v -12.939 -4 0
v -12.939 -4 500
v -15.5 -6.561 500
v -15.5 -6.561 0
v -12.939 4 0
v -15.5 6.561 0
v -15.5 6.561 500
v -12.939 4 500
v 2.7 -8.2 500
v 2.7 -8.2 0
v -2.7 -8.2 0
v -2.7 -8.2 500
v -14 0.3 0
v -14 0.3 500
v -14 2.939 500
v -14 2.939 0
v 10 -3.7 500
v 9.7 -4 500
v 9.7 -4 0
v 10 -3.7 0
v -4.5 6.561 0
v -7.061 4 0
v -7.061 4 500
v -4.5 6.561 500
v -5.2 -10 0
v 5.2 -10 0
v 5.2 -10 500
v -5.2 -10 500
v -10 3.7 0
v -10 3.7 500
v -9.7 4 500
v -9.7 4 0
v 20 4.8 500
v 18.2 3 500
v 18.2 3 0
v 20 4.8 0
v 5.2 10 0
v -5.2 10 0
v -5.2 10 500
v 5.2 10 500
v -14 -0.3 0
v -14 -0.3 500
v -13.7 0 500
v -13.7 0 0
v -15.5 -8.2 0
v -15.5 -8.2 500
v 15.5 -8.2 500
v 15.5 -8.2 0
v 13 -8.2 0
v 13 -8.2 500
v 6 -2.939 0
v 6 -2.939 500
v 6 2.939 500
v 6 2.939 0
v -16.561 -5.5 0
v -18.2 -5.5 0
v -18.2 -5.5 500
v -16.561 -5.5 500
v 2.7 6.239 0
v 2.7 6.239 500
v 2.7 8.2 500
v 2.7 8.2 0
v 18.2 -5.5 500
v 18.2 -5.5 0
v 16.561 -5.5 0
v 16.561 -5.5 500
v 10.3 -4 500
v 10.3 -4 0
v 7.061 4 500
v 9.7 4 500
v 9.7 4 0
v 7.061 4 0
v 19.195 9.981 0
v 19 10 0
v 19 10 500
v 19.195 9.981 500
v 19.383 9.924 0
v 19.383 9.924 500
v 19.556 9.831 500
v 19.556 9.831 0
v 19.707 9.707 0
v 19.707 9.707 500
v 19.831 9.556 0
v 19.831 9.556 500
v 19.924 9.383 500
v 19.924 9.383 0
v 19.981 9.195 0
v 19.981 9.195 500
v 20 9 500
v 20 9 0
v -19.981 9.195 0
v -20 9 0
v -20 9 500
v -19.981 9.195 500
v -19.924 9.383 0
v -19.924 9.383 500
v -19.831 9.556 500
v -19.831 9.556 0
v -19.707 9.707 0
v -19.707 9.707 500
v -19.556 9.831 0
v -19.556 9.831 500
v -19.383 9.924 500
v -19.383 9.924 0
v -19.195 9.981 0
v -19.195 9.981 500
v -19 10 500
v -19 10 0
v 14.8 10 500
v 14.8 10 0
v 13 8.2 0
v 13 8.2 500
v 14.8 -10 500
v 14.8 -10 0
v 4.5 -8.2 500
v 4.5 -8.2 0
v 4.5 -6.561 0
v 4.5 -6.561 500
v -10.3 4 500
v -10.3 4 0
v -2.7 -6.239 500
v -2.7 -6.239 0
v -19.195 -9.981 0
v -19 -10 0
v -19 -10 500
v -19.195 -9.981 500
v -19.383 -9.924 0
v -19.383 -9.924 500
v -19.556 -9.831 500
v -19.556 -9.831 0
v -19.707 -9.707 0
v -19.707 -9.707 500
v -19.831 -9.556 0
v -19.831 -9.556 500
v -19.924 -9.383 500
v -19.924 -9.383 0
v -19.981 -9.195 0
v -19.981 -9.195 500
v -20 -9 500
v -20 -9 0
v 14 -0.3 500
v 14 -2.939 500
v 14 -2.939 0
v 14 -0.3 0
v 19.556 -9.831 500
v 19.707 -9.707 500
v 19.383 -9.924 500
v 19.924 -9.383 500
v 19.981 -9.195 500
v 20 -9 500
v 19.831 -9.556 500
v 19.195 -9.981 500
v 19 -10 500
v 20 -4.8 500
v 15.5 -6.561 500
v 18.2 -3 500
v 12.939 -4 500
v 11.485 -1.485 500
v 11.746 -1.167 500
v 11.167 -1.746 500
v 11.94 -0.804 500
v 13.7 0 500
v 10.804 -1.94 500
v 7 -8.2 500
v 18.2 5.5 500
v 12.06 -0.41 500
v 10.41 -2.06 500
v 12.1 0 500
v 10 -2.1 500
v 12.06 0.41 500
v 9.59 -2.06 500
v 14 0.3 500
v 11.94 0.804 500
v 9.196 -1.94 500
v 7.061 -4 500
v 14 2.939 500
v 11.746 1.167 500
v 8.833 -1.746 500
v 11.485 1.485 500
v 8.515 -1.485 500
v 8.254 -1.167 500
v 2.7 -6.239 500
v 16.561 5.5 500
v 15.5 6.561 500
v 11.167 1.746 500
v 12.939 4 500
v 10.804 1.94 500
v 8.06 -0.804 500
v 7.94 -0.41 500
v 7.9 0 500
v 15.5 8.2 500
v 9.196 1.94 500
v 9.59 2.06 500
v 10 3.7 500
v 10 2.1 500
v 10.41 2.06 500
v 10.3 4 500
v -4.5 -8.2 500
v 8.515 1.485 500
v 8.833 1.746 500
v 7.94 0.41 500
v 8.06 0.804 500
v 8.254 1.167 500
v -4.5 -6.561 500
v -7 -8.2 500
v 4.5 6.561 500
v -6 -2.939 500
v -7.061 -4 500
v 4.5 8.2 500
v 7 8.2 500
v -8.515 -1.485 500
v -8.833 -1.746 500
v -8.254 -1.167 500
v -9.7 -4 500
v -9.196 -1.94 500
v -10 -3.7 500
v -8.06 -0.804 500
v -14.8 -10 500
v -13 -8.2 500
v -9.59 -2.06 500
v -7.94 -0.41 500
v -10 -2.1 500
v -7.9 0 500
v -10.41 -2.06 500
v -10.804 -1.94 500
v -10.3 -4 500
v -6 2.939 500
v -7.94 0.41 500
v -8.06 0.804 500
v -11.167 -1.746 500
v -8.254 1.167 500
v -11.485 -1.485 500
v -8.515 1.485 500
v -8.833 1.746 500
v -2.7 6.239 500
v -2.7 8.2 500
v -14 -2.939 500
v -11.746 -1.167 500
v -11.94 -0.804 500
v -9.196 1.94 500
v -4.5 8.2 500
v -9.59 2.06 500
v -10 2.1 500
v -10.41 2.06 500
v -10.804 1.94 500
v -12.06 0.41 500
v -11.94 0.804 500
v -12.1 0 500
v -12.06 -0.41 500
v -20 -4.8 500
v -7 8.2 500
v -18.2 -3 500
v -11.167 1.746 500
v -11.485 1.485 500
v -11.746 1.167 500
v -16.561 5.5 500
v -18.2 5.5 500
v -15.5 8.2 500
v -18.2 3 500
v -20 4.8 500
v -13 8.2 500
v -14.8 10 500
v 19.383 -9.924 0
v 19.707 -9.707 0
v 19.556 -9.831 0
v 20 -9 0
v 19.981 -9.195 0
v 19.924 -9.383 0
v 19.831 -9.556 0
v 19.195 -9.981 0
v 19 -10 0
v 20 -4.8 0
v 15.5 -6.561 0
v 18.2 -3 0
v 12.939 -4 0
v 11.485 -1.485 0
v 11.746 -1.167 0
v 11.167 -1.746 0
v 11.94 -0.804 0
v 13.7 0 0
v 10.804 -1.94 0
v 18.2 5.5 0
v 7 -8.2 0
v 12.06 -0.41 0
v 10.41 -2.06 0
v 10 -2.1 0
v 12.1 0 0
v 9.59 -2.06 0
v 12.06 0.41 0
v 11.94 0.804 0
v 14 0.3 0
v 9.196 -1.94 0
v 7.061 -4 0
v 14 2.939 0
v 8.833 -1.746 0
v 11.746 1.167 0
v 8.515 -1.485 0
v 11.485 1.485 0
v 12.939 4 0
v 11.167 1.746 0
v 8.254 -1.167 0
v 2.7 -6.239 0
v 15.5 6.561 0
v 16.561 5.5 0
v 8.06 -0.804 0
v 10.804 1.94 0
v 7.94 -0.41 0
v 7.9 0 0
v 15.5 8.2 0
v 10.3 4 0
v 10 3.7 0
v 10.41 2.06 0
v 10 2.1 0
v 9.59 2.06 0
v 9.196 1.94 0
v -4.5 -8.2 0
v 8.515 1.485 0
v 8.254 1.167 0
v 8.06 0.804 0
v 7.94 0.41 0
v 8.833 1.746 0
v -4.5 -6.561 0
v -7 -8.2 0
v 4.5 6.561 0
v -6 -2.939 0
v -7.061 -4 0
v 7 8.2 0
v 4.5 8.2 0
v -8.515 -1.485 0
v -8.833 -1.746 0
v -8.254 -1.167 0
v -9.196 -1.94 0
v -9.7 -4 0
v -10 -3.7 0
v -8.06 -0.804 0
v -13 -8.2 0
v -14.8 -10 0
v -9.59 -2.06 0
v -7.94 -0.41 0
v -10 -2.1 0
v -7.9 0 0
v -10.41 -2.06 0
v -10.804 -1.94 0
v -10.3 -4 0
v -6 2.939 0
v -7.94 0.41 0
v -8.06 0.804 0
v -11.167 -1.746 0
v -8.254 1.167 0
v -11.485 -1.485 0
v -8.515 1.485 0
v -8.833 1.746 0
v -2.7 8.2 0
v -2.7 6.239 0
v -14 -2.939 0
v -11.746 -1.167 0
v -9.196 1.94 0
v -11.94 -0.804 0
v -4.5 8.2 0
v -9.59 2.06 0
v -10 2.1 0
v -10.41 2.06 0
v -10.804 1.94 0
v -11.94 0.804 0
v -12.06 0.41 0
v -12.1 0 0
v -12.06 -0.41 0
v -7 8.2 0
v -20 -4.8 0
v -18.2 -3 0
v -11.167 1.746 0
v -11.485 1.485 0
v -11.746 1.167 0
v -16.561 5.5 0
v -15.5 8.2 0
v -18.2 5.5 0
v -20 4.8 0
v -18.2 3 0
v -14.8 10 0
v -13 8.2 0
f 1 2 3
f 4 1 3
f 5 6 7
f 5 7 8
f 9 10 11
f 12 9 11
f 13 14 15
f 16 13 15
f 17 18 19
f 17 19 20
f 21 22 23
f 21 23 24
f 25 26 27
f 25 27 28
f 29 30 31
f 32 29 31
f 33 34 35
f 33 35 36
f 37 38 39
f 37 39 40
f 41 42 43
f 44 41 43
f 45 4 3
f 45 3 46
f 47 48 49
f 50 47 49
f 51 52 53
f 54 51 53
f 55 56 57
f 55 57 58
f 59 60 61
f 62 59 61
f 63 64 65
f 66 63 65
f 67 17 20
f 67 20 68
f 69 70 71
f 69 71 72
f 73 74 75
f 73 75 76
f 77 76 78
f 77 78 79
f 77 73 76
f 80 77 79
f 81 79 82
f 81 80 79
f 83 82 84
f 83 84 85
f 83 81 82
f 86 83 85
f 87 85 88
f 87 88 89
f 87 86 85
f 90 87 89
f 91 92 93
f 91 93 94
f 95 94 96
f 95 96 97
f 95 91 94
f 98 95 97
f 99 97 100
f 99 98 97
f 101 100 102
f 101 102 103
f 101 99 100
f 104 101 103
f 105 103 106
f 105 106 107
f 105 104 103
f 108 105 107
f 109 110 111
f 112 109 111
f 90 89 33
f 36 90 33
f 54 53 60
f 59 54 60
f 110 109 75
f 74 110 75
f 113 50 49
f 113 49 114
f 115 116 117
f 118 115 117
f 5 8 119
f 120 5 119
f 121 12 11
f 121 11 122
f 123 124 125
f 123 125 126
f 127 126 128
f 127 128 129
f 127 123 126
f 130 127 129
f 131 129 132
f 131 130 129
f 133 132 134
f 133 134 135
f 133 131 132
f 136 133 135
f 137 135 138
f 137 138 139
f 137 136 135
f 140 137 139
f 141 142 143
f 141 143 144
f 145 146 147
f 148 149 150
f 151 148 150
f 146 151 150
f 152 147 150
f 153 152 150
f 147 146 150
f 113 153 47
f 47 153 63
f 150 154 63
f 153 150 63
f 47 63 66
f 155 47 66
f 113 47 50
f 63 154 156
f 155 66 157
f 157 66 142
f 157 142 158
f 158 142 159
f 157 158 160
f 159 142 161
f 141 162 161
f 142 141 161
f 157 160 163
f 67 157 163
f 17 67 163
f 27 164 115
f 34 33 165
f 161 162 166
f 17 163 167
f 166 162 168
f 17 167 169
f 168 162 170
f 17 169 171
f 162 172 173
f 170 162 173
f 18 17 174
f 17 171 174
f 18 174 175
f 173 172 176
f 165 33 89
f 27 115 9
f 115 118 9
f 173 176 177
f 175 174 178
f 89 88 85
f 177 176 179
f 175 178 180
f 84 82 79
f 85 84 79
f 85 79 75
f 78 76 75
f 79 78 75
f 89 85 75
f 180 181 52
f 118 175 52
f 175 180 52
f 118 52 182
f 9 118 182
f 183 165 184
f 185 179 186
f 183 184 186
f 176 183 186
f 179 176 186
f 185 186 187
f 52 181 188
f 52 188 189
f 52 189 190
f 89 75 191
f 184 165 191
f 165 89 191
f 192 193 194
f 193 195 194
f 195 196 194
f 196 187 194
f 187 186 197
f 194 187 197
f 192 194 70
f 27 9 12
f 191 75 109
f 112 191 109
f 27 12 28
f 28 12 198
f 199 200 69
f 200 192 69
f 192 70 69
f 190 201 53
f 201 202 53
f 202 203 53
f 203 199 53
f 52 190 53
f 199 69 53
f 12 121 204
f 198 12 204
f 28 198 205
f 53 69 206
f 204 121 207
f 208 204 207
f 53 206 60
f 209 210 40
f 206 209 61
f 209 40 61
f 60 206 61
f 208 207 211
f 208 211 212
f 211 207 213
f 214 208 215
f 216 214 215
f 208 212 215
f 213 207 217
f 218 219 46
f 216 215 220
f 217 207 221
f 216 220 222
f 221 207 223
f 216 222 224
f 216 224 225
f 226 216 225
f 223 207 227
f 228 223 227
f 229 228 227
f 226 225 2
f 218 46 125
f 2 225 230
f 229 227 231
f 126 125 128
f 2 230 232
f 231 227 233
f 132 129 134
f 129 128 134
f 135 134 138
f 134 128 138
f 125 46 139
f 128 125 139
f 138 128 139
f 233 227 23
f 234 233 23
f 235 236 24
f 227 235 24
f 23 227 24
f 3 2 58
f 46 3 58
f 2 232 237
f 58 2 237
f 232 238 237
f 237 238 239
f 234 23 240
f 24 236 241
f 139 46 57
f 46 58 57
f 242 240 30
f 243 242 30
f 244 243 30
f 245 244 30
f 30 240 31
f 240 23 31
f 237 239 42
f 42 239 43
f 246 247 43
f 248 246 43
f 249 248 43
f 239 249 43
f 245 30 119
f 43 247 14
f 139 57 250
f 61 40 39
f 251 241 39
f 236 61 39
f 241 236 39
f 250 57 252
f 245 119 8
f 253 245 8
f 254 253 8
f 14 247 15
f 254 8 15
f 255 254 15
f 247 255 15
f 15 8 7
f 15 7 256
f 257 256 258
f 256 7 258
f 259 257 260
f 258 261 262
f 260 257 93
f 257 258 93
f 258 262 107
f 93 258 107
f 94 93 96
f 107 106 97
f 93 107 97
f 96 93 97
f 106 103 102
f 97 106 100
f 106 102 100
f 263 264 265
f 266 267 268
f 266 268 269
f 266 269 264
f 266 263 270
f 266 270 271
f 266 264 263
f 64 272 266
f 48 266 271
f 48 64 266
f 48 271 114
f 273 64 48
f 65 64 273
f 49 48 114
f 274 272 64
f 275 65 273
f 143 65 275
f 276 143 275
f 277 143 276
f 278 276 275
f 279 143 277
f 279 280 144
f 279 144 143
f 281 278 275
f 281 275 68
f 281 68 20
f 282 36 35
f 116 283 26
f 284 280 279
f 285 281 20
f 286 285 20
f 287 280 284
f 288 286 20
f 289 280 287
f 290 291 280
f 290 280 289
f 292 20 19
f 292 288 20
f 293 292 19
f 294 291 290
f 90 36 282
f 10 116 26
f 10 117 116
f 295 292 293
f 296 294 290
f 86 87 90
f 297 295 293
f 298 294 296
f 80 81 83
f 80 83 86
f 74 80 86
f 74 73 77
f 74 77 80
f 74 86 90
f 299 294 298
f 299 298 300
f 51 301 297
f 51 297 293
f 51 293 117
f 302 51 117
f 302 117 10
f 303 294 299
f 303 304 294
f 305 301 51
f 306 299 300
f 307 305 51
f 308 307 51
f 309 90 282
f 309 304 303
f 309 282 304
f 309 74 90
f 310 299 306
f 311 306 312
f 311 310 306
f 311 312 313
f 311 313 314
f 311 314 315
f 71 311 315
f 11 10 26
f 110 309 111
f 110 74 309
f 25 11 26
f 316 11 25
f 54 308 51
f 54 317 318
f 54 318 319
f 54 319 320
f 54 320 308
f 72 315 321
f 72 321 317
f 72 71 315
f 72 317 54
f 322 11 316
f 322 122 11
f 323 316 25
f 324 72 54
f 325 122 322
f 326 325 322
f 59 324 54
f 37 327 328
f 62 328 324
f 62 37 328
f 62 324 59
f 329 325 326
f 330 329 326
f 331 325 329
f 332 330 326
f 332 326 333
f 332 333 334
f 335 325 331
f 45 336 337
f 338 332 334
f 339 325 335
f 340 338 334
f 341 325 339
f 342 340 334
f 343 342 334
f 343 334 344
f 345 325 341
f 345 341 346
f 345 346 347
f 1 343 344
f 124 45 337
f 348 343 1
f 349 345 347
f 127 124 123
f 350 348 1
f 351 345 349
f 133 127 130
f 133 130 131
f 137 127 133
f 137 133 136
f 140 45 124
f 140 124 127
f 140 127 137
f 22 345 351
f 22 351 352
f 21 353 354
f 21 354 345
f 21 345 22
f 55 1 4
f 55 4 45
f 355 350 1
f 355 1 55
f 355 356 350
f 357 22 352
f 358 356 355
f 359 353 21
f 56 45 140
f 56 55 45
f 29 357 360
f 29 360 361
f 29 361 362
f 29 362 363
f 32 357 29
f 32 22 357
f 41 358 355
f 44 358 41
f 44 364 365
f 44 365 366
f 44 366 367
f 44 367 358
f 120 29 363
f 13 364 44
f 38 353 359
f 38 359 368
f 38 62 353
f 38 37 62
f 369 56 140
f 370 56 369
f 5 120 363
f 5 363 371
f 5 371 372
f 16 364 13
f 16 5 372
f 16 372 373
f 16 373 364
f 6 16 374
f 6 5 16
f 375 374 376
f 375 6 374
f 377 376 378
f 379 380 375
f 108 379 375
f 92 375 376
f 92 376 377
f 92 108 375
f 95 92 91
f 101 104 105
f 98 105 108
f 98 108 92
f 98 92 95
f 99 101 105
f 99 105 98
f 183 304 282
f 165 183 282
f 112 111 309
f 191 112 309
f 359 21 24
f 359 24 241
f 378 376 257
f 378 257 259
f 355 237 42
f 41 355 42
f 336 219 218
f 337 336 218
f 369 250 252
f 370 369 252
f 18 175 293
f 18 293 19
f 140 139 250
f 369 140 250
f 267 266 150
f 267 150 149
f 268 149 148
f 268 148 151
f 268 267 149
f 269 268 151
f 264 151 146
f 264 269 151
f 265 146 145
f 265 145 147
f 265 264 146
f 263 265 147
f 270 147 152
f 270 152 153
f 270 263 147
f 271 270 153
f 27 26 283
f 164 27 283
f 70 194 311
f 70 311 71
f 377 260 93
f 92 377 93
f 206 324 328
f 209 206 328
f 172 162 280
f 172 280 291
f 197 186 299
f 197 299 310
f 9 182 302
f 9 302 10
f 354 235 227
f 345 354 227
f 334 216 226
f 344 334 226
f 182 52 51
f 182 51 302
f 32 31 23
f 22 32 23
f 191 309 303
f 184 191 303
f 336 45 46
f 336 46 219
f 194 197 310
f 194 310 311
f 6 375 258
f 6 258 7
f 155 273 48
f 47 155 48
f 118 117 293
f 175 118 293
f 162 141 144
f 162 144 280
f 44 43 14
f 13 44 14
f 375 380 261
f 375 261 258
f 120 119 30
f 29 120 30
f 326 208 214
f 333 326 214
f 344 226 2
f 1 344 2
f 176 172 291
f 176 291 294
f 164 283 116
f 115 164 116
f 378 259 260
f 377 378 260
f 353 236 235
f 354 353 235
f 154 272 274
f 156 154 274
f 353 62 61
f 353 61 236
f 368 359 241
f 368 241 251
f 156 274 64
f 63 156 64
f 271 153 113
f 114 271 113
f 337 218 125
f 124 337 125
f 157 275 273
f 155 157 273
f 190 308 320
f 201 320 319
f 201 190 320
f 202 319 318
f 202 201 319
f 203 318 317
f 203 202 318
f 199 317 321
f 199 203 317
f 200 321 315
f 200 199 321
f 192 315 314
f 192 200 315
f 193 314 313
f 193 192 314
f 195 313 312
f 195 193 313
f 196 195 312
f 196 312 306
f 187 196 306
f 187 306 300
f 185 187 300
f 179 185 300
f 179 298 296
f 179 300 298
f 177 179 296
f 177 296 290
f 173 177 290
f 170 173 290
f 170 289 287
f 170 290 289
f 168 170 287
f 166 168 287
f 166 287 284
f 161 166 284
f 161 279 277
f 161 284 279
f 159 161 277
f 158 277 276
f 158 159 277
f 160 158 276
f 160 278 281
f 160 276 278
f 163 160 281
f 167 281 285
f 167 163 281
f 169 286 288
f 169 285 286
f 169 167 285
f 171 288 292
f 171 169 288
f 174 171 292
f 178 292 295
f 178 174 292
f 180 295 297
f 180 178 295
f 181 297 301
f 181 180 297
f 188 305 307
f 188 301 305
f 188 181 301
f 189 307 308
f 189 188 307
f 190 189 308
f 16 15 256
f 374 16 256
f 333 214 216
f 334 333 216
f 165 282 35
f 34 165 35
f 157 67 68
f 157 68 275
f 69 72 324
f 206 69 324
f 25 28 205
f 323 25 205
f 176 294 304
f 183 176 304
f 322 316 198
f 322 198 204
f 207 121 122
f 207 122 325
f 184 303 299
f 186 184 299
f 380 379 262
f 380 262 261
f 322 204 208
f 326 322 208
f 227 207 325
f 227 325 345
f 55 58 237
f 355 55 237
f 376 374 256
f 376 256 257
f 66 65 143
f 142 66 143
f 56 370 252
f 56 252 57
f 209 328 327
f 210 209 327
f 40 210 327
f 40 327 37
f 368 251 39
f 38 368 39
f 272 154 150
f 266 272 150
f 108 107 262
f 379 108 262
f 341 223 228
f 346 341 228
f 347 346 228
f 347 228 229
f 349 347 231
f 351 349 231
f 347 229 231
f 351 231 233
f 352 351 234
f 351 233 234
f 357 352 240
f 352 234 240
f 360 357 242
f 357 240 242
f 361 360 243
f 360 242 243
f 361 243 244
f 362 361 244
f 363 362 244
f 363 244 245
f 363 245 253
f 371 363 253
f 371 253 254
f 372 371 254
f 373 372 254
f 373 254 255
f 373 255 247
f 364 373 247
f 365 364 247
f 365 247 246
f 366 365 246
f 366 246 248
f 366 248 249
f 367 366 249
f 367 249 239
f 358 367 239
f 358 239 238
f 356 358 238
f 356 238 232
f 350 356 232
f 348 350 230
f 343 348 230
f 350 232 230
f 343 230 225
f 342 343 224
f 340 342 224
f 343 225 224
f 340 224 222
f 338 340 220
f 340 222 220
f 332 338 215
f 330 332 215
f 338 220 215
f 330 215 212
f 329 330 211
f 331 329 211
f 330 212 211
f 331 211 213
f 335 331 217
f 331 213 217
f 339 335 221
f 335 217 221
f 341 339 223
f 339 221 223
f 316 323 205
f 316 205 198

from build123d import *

# Parameters (mm, degrees)
RESSALTO_EXTRUS_O1_DEPTH = 500
CANAL_DEPTH              = 800
ESBO_O2_5_R              = 2.1
FURO_DEPTH               = 501.49975025
CORTE_EXTRUS_O4_DEPTH    = 501.49975025
PADR_OCIRCULAR2_COUNT    = 3
PADR_OCIRCULAR2_ANGLE    = 180
ESPELHAR2_COPY_1_DEPTH   = 800
ESPELHAR2_COPY_2_DEPTH   = 800


with BuildPart() as part:
    # Esboço1 → Ressalto-extrusão1 (new body)
    with BuildSketch(Plane.XY):
        with BuildLine():
            Line((-19, 10), (19, 10))
            ThreePointArc((19, 10), (19.707106781, 9.707106781), (20, 9))
            Line((20, 9), (20, -9))
            ThreePointArc((20, -9), (19.707106781, -9.707106781), (19, -10))
            Line((19, -10), (-19, -10))
            ThreePointArc((-19, -10), (-19.707106781, -9.707106781), (-20, -9))
            Line((-20, -9), (-20, 9))
            ThreePointArc((-20, 9), (-19.707106781, 9.707106781), (-19, 10))
        make_face()
    extrude(amount=RESSALTO_EXTRUS_O1_DEPTH)

    # Esboço2 → CANAL (cut)
    with BuildSketch(Plane.XY.offset(500)):
        Polygon((-14.8, 10), (-13, 8.2), (-15.5, 8.2), (-15.5, 6.560660172), (-12.939339828, 4), (-10.3, 4), (-10, 3.7), (-9.7, 4), (-7.060660172, 4), (-4.5, 6.560660172), (-4.5, 8.2), (-7, 8.2), (-5.2, 10), align=None)
    canal = extrude(amount=-CANAL_DEPTH, mode=Mode.SUBTRACT)

    # Esboço2<5> → FURO (cut, through all)
    with BuildSketch(Plane.XY.offset(500)):
        with Locations((-10, 0)):
            Circle(ESBO_O2_5_R)
    furo = extrude(amount=-FURO_DEPTH, mode=Mode.SUBTRACT)

    # Esboço2<6> → Corte-extrusão4 (cut, through all)
    with BuildSketch(Plane.XY.offset(500)):
        Polygon((-2.7, 8.2), (-2.7, 6.239339828), (-6, 2.939339828), (-6, 0), (6, 0), (6, 2.939339828), (2.7, 6.239339828), (2.7, 8.2), align=None)
    corte_extrus_o4 = extrude(amount=-CORTE_EXTRUS_O4_DEPTH, mode=Mode.SUBTRACT)

    # PadrãoCircular2: CANAL ×3 about axis
    padr_ocircular2_axis = Axis((-10, 0, 0), (0, 0, 1))
    for i in range(1, PADR_OCIRCULAR2_COUNT):
        add(canal.rotate(padr_ocircular2_axis, i * PADR_OCIRCULAR2_ANGLE / (PADR_OCIRCULAR2_COUNT - 1)), mode=Mode.SUBTRACT)

    # Espelhar2: CANAL, FURO, Corte-extrusão4 across plane
    add(canal.mirror(Plane(origin=(0, 0, 0), x_dir=(0, 0, 1), z_dir=(1, 0, 0))), mode=Mode.SUBTRACT)
    add(furo.mirror(Plane(origin=(0, 0, 0), x_dir=(0, 0, 1), z_dir=(1, 0, 0))), mode=Mode.SUBTRACT)
    add(corte_extrus_o4.mirror(Plane(origin=(0, 0, 0), x_dir=(0, 0, 1), z_dir=(1, 0, 0))), mode=Mode.SUBTRACT)

    # Espelhar2 copy 1 sketch → Espelhar2 copy 1 (cut)
    with BuildSketch(Plane(origin=(10, 10, 500), x_dir=(0, 1, 0), z_dir=(0, 0, 1))):
        Polygon((-14.8, -10), (-13, -8.2), (-15.5, -8.2), (-15.5, -6.560660172), (-12.939339828, -4), (-10.3, -4), (-10, -3.7), (-9.7, -4), (-7.060660172, -4), (-4.5, -6.560660172), (-4.5, -8.2), (-7, -8.2), (-5.2, -10), align=None)
    extrude(amount=-ESPELHAR2_COPY_1_DEPTH, mode=Mode.SUBTRACT)

    # Espelhar2 copy 2 sketch → Espelhar2 copy 2 (cut)
    with BuildSketch(Plane(origin=(20, 0, 500), x_dir=(1, 0, 0), z_dir=(0, 0, 1))):
        Polygon((-14.8, -10), (-13, -8.2), (-15.5, -8.2), (-15.5, -6.560660172), (-12.939339828, -4), (-10.3, -4), (-10, -3.7), (-9.7, -4), (-7.060660172, -4), (-4.5, -6.560660172), (-4.5, -8.2), (-7, -8.2), (-5.2, -10), align=None)
    extrude(amount=-ESPELHAR2_COPY_2_DEPTH, mode=Mode.SUBTRACT)

    # Espelhar3: Corte-extrusão4 across plane
    add(corte_extrus_o4.mirror(Plane.ZX), mode=Mode.SUBTRACT)


solid = part.part
